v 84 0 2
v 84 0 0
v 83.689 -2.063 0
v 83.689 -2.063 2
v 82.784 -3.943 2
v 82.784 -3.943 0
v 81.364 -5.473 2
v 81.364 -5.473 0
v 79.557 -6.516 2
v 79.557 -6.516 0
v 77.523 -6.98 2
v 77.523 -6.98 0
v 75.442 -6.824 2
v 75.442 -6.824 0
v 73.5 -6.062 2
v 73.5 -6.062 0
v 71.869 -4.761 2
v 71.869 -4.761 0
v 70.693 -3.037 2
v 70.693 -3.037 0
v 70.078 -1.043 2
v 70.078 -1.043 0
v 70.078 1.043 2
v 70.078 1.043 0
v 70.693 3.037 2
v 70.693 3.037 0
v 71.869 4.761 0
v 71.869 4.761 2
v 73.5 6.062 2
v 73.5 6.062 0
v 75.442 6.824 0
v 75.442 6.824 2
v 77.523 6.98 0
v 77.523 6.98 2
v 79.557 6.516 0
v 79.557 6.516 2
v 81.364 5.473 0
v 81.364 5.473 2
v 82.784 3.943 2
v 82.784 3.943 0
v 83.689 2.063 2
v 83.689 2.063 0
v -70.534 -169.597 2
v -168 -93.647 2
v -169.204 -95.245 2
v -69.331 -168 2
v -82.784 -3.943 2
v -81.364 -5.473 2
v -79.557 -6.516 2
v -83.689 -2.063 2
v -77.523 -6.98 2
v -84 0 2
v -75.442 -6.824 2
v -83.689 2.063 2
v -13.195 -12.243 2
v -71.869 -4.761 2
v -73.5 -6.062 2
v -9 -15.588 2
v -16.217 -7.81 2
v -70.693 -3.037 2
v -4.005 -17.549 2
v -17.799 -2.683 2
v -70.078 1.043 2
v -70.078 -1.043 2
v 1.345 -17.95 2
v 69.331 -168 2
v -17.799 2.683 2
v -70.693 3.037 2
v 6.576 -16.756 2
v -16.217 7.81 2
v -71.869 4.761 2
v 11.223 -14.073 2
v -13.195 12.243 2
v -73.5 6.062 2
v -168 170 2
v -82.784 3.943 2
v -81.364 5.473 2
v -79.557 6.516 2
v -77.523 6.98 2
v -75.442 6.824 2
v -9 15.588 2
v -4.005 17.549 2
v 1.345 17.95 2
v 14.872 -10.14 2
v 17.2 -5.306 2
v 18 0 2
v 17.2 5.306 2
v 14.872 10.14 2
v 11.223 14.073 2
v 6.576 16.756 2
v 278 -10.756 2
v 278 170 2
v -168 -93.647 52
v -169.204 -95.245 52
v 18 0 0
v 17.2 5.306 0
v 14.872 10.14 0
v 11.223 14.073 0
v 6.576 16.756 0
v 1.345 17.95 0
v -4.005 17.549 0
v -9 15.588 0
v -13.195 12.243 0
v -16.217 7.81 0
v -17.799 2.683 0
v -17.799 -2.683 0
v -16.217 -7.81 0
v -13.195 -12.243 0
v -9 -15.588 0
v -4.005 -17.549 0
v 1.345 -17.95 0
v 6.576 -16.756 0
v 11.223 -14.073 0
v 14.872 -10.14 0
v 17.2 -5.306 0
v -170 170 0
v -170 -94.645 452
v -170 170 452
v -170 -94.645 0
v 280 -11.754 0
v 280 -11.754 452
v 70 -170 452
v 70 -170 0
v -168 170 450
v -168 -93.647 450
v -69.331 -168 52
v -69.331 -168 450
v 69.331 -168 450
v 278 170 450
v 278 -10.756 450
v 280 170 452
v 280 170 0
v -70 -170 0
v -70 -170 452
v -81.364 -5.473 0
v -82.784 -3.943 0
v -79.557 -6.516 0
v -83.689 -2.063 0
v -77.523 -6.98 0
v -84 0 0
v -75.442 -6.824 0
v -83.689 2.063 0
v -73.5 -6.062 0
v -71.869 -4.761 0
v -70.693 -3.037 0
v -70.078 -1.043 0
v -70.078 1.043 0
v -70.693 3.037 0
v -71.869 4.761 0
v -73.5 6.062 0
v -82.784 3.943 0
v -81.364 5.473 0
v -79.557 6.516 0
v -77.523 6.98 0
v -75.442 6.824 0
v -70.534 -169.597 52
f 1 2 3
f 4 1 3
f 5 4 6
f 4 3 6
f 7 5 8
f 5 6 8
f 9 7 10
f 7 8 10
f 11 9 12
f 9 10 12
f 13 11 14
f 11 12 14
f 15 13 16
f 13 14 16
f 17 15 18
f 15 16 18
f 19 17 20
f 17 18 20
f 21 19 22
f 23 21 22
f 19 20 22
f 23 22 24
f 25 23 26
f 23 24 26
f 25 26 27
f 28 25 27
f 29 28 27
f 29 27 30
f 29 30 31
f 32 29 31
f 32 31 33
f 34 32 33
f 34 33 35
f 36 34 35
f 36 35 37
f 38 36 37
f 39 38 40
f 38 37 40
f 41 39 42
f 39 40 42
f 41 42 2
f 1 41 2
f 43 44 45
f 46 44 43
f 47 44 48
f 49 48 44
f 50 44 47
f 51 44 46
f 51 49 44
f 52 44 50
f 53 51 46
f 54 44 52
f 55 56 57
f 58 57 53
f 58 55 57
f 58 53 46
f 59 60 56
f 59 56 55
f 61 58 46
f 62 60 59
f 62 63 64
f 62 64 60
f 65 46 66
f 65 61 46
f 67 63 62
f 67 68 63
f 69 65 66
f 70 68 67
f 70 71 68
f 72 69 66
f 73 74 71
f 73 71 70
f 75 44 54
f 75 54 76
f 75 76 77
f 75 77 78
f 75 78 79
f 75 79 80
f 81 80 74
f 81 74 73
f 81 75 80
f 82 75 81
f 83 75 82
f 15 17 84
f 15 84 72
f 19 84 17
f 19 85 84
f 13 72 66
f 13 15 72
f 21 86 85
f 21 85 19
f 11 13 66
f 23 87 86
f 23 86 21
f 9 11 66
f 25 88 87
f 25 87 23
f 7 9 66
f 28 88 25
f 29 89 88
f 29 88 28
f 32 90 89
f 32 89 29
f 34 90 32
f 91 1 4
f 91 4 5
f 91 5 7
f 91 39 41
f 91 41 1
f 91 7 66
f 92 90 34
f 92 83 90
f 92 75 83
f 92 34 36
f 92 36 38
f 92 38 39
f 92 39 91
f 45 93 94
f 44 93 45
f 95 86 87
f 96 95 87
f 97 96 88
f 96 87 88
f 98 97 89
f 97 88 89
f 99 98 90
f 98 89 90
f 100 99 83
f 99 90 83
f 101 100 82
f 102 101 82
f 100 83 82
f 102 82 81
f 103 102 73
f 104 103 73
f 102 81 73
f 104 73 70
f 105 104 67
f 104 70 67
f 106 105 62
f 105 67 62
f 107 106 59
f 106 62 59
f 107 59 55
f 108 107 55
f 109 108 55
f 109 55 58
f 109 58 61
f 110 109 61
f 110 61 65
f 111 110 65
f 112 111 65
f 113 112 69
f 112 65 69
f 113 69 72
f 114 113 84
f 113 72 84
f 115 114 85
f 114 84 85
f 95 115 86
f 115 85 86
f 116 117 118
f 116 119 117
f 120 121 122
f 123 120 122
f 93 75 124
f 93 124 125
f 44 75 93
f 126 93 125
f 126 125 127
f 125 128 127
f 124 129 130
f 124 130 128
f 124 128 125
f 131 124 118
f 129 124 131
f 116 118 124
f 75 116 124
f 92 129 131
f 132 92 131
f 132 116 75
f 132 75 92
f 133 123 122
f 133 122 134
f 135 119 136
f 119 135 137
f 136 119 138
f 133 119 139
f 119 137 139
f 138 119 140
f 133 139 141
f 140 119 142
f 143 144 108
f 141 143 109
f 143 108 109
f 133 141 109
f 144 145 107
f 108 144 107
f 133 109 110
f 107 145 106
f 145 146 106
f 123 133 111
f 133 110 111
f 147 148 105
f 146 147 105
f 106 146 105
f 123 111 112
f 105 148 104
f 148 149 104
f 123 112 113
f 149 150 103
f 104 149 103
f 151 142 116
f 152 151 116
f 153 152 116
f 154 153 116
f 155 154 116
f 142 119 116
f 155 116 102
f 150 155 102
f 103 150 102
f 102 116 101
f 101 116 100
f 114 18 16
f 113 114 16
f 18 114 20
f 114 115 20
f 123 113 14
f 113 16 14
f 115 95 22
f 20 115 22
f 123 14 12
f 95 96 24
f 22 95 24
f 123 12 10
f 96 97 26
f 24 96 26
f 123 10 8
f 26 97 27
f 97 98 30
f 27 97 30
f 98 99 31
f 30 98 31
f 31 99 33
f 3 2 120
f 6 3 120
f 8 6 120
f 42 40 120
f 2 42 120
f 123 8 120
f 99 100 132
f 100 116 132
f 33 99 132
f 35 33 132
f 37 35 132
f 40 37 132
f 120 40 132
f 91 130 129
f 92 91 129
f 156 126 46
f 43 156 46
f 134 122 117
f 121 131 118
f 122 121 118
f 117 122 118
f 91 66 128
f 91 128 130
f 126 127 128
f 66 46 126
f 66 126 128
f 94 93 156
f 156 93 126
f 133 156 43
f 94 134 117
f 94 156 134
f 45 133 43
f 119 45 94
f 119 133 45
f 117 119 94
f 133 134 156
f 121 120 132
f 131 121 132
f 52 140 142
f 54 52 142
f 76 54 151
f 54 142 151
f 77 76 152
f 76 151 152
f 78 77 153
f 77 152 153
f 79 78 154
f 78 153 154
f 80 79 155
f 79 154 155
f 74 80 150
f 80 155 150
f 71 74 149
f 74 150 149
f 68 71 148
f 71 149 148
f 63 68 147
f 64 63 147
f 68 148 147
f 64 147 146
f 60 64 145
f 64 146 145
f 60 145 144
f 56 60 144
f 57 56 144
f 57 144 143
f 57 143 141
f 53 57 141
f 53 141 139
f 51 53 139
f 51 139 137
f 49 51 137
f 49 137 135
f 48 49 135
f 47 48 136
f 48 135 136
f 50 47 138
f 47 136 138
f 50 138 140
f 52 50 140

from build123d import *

# Parameters (mm, degrees)
SALIENTE_EXTRUIR1_DEPTH = 2
SALIENTE_EXTRUIR2_DEPTH = 450
SALIENTE_EXTRUIR3_DEPTH = 2
CROQUIS4_R              = 18
CORTAR_EXTRUIR1_DEPTH   = 2
CROQUIS5_W              = 123.547211961
CROQUIS5_H              = 50
CORTAR_EXTRUIR2_DEPTH   = 2
CROQUIS6_R              = 7
CORTAR_EXTRUIR3_DEPTH   = 2


with BuildPart() as part:
    # Croquis1 → Saliente-Extruir1 (new body)
    with BuildSketch(Plane.XY):
        Polygon((-70, -170), (70, -170), (280, -11.753649478), (280, 170), (-170, 170), (-170, -94.64459499), align=None)
    extrude(amount=SALIENTE_EXTRUIR1_DEPTH)

    # Croquis2 → Saliente-Extruir2 (add)
    with BuildSketch(Plane.XY.offset(2)):
        Polygon((-170, 170), (-168, 170), (-168, -93.647431774), (-69.330809361, -168), (69.330809361, -168), (278, -10.756486262), (278, 170), (280, 170), (280, -11.753649478), (70, -170), (-70, -170), (-170, -94.64459499), align=None)
    extrude(amount=SALIENTE_EXTRUIR2_DEPTH)

    # Croquis3 → Saliente-Extruir3 (add)
    with BuildSketch(Plane.XY.offset(452)):
        Polygon((-170, 170), (280, 170), (280, -11.753649478), (70, -170), (-70, -170), (-170, -94.64459499), align=None)
    extrude(amount=-SALIENTE_EXTRUIR3_DEPTH)

    # Croquis4 → Cortar-Extruir1 (cut)
    with BuildSketch(Plane.XY.offset(2)):
        Circle(CROQUIS4_R)
    extrude(amount=-CORTAR_EXTRUIR1_DEPTH, mode=Mode.SUBTRACT)

    # Croquis5 → Cortar-Extruir2 (cut)
    with BuildSketch(Plane(origin=(-105.856306655, -140.476063582, 0), x_dir=(0.7986355100472919, -0.6018150231520497, 0), z_dir=(0.6018150231520497, 0.7986355100472919, 0))):
        with Locations((-16.038728387, -27)):
            Rectangle(CROQUIS5_W, CROQUIS5_H)
    extrude(amount=-CORTAR_EXTRUIR2_DEPTH, mode=Mode.SUBTRACT)

    # Croquis6 → Cortar-Extruir3 (cut)
    with BuildSketch(Plane(origin=(0, 0, 0), x_dir=(-1, 0, 0), z_dir=(0, 0, -1))):
        with Locations((77, 0)):
            Circle(CROQUIS6_R)
        with Locations(Location((-77, 0, 0), (0, 0, 180))):
            Circle(CROQUIS6_R)
    extrude(amount=-CORTAR_EXTRUIR3_DEPTH, mode=Mode.SUBTRACT)


solid = part.part
